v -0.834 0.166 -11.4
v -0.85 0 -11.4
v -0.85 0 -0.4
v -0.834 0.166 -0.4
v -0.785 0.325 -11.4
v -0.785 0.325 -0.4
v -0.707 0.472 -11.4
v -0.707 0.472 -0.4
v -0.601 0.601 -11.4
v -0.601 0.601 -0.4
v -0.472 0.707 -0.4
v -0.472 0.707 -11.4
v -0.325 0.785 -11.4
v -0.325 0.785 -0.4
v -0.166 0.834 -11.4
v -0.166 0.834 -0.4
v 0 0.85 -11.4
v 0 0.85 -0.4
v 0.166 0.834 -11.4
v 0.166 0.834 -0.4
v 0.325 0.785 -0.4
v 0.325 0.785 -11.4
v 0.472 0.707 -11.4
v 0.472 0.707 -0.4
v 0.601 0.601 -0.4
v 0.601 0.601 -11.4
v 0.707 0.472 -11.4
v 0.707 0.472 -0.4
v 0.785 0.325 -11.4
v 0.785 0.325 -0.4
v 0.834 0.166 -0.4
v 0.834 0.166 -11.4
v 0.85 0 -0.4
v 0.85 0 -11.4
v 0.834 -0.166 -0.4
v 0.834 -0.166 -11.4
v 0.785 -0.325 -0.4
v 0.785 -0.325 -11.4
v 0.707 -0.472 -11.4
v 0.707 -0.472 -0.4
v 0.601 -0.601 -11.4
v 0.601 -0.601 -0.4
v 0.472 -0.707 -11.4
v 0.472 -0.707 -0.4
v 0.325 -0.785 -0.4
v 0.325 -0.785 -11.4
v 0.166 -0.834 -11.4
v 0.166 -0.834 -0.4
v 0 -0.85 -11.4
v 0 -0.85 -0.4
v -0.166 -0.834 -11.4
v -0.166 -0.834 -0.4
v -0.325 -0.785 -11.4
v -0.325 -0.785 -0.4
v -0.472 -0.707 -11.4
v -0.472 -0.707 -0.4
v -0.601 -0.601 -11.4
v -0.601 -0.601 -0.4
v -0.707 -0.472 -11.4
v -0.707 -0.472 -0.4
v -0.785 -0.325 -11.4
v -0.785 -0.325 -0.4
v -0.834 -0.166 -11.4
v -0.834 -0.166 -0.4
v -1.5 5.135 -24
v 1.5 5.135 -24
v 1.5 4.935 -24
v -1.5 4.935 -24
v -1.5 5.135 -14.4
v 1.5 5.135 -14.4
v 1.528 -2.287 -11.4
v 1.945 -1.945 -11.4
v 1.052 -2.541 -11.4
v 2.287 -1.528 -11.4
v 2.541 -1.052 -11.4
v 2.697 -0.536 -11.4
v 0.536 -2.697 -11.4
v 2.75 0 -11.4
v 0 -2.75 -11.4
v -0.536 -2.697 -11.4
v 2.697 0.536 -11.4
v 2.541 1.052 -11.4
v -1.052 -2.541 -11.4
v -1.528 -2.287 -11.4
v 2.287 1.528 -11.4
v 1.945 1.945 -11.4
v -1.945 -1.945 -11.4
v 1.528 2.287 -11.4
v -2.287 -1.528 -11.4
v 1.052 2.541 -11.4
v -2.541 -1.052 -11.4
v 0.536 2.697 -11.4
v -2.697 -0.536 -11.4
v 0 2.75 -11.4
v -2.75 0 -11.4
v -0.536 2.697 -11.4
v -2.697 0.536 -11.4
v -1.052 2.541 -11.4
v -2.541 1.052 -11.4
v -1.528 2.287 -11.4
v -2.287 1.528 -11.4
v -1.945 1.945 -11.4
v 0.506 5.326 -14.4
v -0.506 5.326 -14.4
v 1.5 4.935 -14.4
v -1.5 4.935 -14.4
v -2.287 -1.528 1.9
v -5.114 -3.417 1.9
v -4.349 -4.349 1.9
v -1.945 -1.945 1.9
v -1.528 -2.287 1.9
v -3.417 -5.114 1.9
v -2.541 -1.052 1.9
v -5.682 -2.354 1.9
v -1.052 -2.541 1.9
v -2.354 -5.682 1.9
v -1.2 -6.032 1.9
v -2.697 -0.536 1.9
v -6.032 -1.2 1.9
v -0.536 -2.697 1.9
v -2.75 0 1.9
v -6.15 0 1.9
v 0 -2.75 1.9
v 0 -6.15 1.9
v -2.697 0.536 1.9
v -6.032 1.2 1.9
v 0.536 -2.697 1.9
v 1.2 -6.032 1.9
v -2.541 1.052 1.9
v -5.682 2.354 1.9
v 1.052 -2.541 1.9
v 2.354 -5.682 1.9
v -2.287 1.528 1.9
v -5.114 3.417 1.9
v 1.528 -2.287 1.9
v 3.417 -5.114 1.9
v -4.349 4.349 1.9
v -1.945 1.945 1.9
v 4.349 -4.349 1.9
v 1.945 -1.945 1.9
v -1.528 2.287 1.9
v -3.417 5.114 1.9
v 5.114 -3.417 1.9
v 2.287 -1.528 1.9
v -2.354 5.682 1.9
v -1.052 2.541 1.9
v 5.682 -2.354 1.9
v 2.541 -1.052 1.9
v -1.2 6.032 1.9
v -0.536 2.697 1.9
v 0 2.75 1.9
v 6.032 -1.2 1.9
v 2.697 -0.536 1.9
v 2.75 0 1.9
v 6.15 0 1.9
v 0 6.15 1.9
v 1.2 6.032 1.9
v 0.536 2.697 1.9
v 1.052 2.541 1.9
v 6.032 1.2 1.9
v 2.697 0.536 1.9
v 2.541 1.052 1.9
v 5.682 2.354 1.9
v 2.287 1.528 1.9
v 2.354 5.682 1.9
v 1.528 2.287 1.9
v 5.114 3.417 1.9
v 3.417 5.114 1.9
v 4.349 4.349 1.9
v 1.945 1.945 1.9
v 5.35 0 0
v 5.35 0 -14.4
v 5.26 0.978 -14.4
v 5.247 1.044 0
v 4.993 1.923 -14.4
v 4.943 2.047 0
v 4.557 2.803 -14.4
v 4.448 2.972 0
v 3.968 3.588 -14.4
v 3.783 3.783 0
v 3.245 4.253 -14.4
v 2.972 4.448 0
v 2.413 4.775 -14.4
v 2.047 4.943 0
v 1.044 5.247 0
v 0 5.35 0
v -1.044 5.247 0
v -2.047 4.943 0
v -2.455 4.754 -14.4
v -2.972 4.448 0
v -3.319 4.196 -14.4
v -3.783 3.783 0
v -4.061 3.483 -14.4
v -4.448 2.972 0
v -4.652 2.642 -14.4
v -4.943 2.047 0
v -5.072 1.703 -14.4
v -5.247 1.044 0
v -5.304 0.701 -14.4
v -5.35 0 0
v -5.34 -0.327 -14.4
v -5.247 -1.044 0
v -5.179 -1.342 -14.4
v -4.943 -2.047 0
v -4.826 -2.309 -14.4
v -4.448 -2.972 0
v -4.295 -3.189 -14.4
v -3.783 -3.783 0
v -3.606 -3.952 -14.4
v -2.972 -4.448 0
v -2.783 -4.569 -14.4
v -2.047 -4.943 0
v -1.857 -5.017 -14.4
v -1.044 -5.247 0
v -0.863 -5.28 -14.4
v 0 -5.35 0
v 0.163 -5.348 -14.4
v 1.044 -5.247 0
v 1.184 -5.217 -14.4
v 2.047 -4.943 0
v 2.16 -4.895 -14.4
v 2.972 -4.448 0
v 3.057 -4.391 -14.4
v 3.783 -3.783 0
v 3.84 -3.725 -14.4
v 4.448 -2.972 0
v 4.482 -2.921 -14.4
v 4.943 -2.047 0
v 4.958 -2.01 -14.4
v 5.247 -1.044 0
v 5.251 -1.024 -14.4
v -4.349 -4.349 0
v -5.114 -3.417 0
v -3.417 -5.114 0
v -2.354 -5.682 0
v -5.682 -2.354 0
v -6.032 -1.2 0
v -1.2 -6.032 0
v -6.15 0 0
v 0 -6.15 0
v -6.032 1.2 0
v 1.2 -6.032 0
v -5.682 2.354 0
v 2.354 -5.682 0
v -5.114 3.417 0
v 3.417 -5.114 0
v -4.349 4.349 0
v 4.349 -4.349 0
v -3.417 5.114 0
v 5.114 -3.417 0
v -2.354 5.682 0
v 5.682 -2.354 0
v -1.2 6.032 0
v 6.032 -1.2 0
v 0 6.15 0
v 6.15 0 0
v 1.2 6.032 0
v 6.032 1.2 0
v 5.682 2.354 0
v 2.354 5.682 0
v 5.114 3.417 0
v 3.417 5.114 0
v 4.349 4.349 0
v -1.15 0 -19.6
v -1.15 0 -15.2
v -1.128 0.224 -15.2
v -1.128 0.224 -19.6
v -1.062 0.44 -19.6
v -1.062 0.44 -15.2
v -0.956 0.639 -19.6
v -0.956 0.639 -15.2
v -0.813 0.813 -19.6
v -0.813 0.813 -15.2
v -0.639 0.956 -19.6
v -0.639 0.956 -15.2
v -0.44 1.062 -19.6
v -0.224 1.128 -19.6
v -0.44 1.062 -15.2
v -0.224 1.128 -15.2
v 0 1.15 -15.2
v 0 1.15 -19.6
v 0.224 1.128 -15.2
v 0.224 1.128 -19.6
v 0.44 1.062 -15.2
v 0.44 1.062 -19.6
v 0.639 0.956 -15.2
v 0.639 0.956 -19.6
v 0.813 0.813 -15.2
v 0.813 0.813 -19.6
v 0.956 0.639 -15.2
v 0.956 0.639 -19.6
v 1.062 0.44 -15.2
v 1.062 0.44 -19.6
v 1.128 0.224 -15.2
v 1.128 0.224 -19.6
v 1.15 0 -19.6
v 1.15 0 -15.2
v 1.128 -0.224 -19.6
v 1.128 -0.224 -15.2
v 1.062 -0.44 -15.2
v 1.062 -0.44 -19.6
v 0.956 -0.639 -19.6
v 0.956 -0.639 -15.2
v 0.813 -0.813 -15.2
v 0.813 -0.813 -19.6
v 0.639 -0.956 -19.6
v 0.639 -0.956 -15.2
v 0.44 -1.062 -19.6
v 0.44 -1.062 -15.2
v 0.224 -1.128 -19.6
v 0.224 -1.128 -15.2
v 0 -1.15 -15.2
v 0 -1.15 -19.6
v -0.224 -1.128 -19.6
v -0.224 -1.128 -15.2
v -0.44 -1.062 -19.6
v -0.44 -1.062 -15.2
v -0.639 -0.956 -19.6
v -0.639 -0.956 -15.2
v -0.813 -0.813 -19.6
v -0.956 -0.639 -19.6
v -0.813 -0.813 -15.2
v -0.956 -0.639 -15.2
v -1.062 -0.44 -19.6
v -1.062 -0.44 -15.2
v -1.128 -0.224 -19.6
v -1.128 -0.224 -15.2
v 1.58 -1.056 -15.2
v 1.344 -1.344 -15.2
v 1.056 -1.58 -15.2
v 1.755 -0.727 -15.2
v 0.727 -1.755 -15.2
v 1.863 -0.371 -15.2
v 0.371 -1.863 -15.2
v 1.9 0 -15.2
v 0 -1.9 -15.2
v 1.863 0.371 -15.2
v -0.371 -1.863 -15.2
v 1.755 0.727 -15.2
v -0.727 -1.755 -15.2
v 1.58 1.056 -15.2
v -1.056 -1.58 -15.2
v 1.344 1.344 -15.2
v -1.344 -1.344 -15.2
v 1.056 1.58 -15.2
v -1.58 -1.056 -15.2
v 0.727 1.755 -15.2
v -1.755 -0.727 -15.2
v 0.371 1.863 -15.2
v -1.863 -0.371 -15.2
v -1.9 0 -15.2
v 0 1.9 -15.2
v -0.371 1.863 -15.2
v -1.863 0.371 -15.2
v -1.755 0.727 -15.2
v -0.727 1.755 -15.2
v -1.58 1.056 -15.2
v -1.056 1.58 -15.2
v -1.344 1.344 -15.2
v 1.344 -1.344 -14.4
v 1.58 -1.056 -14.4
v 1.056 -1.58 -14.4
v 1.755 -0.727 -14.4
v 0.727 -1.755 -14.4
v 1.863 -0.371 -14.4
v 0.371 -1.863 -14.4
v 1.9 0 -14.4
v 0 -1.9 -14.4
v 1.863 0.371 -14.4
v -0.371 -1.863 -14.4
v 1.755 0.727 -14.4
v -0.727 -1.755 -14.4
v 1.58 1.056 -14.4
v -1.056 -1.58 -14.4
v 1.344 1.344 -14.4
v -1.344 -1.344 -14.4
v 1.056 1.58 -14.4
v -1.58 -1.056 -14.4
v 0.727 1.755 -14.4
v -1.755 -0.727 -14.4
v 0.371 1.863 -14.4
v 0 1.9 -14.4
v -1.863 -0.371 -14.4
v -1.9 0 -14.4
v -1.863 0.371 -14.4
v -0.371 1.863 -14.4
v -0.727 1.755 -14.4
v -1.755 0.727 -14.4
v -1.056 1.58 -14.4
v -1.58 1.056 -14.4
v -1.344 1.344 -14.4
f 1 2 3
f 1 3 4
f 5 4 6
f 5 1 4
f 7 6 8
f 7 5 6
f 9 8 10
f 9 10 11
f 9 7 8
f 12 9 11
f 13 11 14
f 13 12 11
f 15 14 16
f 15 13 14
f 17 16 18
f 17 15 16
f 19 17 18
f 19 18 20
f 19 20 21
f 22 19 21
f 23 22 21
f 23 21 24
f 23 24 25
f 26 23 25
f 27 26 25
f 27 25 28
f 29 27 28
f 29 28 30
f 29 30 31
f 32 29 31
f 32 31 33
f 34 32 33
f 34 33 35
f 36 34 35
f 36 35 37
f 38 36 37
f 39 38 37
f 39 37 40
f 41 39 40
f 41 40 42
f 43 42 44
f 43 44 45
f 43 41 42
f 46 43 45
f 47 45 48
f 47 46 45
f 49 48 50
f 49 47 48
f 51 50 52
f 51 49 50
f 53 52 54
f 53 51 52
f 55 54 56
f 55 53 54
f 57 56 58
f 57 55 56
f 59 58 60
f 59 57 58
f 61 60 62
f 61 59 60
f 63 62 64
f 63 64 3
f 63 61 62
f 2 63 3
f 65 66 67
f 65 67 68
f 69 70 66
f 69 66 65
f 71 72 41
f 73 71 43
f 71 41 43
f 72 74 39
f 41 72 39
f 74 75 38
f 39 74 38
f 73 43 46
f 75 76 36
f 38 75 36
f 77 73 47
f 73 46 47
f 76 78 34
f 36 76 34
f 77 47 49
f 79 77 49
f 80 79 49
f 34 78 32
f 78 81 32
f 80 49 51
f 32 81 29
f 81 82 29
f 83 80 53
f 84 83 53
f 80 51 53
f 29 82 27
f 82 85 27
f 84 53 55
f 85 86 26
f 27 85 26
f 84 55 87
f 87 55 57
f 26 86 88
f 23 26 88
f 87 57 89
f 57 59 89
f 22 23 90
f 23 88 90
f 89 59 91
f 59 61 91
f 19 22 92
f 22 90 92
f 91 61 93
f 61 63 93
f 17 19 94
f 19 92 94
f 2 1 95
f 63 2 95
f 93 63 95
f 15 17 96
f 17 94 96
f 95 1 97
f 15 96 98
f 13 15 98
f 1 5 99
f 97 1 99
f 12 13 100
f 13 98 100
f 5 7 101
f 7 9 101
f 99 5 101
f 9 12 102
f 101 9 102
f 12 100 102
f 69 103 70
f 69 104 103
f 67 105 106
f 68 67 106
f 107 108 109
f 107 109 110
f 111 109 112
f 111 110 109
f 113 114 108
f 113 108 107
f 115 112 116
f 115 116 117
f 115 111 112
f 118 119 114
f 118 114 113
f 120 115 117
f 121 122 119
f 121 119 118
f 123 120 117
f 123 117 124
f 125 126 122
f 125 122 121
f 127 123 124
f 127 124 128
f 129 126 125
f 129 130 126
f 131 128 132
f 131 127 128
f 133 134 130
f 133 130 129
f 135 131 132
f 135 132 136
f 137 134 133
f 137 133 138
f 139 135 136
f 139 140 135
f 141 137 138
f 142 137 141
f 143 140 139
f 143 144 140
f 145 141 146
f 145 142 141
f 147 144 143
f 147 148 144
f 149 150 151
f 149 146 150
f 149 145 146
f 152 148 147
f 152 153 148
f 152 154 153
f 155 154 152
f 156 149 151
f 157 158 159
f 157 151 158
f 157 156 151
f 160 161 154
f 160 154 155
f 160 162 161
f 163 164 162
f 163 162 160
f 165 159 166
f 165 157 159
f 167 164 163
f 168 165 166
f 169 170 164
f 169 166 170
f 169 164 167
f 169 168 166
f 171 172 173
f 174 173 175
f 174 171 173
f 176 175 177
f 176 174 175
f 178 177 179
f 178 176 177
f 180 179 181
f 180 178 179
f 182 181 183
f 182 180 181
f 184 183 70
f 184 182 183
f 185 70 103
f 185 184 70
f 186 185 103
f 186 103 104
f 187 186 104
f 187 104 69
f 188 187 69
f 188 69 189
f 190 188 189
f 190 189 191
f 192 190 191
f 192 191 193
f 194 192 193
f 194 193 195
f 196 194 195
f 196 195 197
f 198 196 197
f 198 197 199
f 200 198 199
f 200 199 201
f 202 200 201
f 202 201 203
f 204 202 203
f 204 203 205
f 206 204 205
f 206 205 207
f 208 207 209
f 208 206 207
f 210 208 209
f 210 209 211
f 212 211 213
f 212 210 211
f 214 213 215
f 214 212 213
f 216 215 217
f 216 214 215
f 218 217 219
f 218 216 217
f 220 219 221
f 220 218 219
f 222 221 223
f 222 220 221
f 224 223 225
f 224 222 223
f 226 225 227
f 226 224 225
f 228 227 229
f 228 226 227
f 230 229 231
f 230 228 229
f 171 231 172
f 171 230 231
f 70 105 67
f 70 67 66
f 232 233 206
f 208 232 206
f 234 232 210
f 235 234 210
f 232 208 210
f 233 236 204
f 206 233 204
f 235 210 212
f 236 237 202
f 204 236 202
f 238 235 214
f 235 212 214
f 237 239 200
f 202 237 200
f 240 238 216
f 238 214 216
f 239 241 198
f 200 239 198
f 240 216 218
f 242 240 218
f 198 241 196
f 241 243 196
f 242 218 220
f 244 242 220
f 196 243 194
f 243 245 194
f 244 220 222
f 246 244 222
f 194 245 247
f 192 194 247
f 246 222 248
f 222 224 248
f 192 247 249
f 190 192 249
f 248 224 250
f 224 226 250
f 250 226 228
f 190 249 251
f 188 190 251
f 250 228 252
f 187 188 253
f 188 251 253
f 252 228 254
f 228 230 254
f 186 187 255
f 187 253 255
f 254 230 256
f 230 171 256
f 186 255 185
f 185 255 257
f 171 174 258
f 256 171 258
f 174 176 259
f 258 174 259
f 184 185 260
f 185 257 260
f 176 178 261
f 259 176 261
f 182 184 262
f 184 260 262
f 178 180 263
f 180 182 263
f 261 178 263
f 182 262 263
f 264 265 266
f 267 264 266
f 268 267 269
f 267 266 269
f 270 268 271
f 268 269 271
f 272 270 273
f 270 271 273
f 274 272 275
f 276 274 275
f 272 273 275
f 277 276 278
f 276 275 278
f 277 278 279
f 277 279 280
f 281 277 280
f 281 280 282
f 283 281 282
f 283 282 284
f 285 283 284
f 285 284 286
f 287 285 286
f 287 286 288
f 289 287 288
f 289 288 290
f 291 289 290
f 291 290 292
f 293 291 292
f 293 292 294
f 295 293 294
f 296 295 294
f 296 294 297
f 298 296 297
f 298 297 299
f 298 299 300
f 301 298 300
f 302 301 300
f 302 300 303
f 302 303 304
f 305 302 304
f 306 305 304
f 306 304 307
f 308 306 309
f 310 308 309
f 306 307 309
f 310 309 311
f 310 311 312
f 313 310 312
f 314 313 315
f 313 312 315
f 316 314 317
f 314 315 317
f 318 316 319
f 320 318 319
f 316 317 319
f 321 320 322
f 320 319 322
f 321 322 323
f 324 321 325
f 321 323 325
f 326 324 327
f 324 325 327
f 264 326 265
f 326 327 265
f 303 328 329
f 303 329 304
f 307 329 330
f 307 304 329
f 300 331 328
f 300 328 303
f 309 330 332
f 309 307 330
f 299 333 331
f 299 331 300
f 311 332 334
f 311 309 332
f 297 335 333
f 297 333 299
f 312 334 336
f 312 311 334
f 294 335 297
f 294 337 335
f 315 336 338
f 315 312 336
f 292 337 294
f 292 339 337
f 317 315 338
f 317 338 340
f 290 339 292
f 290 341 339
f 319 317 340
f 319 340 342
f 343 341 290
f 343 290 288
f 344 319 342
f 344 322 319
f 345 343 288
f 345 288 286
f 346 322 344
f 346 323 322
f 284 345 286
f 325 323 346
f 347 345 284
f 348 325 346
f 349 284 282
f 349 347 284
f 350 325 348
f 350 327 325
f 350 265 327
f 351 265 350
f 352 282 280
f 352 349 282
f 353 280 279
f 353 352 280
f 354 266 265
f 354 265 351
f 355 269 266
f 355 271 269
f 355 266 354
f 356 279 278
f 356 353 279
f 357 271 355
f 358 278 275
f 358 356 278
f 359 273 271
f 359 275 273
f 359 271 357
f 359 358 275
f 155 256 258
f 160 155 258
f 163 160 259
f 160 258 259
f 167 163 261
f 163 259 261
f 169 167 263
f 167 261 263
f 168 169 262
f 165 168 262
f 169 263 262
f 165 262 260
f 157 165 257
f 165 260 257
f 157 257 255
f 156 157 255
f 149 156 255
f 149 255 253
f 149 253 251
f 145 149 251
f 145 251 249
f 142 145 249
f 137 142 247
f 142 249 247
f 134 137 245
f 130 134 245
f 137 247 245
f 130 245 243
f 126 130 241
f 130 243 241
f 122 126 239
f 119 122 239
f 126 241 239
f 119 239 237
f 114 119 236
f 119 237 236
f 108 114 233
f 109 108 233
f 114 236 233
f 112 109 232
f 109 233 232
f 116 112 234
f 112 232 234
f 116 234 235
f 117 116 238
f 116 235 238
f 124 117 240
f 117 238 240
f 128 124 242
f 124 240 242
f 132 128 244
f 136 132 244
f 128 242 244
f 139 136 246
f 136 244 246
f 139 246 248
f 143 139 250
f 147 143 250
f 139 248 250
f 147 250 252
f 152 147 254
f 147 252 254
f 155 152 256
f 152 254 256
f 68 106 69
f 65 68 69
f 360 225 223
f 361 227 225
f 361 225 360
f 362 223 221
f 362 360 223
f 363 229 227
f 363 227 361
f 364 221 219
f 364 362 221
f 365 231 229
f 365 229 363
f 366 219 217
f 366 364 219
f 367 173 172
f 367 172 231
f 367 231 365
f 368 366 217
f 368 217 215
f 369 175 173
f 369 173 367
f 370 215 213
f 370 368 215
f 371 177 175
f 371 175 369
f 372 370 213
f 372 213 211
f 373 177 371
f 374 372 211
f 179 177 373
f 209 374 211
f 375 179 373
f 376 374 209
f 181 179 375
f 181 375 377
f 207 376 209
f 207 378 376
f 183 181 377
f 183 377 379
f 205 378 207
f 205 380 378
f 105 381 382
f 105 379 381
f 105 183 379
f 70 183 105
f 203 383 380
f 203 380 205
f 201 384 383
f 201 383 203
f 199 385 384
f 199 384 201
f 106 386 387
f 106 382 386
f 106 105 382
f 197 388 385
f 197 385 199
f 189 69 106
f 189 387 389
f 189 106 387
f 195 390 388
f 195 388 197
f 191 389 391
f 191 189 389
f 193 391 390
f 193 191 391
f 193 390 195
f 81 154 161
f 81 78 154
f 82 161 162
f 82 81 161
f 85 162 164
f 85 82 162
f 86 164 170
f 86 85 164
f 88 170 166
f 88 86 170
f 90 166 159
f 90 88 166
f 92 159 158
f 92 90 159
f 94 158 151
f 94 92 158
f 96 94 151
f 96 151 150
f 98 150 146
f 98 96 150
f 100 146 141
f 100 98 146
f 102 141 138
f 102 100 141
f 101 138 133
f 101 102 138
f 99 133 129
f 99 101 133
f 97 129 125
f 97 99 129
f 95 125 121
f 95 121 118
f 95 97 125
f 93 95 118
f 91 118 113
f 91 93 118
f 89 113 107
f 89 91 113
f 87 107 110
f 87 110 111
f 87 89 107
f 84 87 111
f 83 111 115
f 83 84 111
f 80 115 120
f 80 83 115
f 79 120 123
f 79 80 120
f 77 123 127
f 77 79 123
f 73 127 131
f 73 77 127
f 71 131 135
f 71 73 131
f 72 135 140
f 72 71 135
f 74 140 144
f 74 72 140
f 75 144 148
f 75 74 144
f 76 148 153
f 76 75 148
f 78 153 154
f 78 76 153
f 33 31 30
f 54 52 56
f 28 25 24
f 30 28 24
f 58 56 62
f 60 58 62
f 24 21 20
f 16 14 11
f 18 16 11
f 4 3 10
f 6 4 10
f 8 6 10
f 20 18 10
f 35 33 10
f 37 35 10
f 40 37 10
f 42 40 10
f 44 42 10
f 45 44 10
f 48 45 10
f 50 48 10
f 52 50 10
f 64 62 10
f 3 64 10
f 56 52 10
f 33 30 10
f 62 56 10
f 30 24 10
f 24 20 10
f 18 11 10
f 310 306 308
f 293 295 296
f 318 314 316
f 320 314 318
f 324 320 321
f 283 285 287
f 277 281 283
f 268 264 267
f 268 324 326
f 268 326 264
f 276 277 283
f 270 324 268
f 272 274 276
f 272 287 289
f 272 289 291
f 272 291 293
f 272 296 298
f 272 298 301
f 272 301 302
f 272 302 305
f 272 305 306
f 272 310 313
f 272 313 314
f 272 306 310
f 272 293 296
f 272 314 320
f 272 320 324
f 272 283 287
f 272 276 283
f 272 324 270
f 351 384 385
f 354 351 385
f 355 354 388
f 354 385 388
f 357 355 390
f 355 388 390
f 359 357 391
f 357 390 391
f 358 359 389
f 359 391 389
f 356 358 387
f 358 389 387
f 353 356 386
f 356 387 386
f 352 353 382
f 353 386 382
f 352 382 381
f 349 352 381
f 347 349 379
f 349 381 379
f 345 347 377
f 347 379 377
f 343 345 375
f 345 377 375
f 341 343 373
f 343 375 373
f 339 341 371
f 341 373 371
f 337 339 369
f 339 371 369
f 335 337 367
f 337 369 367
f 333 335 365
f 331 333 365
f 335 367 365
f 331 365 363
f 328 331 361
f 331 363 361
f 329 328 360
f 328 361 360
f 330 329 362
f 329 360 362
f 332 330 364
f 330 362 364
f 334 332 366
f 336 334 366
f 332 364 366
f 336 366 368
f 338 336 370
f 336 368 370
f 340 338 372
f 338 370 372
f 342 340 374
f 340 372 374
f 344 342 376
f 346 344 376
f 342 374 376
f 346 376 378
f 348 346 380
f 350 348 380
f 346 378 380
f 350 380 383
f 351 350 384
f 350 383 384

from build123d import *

# Parameters (mm, degrees)
SKETCH1_R           = 6.15
SKETCH1_R_2         = 2.75
BOSS_EXTRUDE1_DEPTH = 1.9
BOSS_EXTRUDE2_START = -14.4
SKETCH1_3_R         = 5.35
SKETCH1_3_R_2       = 2.75
BOSS_EXTRUDE2_DEPTH = 14.4
SKETCH2_R           = 2.75
BOSS_EXTRUDE3_DEPTH = 3
SKETCH2_3_R         = 1.9
BOSS_EXTRUDE4_DEPTH = 0.8
SKETCH2_5_R         = 0.85
BOSS_EXTRUDE5_DEPTH = 14
SKETCH2_6_R         = 1.15
BOSS_EXTRUDE6_DEPTH = 5.2
SKETCH2_7_W         = 3
SKETCH2_7_H         = 0.2
BOSS_EXTRUDE7_DEPTH = 9.6


with BuildPart() as part:
    # Sketch1 → Boss-Extrude1 (new body)
    with BuildSketch(Plane.XY):
        Circle(SKETCH1_R)
        Circle(SKETCH1_R_2, mode=Mode.SUBTRACT)
    extrude(amount=BOSS_EXTRUDE1_DEPTH)

    # Sketch1<3> → Boss-Extrude2 (add)
    with BuildSketch(Plane.XY.offset(BOSS_EXTRUDE2_START)):
        Circle(SKETCH1_3_R)
        Circle(SKETCH1_3_R_2, mode=Mode.SUBTRACT)
    extrude(amount=BOSS_EXTRUDE2_DEPTH)

    # Sketch2 → Boss-Extrude3 (add)
    with BuildSketch(Plane(origin=(0, 0, -14.4), x_dir=(-1, 0, 0), z_dir=(0, 0, -1))):
        Circle(SKETCH2_R)
    extrude(amount=-BOSS_EXTRUDE3_DEPTH)

    # Sketch2<3> → Boss-Extrude4 (add)
    with BuildSketch(Plane(origin=(0, 0, -14.4), x_dir=(-1, 0, 0), z_dir=(0, 0, -1))):
        Circle(SKETCH2_3_R)
    extrude(amount=BOSS_EXTRUDE4_DEPTH)

    # Sketch2<5> → Boss-Extrude5 (add)
    with BuildSketch(Plane(origin=(0, 0, -14.4), x_dir=(-1, 0, 0), z_dir=(0, 0, -1))):
        Circle(SKETCH2_5_R)
    extrude(amount=-BOSS_EXTRUDE5_DEPTH)

    # Sketch2<6> → Boss-Extrude6 (add)
    with BuildSketch(Plane(origin=(0, 0, -14.4), x_dir=(-1, 0, 0), z_dir=(0, 0, -1))):
        Circle(SKETCH2_6_R)
    extrude(amount=BOSS_EXTRUDE6_DEPTH)

    # Sketch2<7> → Boss-Extrude7 (add)
    with BuildSketch(Plane(origin=(0, 0, -14.4), x_dir=(-1, 0, 0), z_dir=(0, 0, -1))):
        with Locations((0, 5.035416244)):
            Rectangle(SKETCH2_7_W, SKETCH2_7_H)
    extrude(amount=BOSS_EXTRUDE7_DEPTH)


solid = part.part
